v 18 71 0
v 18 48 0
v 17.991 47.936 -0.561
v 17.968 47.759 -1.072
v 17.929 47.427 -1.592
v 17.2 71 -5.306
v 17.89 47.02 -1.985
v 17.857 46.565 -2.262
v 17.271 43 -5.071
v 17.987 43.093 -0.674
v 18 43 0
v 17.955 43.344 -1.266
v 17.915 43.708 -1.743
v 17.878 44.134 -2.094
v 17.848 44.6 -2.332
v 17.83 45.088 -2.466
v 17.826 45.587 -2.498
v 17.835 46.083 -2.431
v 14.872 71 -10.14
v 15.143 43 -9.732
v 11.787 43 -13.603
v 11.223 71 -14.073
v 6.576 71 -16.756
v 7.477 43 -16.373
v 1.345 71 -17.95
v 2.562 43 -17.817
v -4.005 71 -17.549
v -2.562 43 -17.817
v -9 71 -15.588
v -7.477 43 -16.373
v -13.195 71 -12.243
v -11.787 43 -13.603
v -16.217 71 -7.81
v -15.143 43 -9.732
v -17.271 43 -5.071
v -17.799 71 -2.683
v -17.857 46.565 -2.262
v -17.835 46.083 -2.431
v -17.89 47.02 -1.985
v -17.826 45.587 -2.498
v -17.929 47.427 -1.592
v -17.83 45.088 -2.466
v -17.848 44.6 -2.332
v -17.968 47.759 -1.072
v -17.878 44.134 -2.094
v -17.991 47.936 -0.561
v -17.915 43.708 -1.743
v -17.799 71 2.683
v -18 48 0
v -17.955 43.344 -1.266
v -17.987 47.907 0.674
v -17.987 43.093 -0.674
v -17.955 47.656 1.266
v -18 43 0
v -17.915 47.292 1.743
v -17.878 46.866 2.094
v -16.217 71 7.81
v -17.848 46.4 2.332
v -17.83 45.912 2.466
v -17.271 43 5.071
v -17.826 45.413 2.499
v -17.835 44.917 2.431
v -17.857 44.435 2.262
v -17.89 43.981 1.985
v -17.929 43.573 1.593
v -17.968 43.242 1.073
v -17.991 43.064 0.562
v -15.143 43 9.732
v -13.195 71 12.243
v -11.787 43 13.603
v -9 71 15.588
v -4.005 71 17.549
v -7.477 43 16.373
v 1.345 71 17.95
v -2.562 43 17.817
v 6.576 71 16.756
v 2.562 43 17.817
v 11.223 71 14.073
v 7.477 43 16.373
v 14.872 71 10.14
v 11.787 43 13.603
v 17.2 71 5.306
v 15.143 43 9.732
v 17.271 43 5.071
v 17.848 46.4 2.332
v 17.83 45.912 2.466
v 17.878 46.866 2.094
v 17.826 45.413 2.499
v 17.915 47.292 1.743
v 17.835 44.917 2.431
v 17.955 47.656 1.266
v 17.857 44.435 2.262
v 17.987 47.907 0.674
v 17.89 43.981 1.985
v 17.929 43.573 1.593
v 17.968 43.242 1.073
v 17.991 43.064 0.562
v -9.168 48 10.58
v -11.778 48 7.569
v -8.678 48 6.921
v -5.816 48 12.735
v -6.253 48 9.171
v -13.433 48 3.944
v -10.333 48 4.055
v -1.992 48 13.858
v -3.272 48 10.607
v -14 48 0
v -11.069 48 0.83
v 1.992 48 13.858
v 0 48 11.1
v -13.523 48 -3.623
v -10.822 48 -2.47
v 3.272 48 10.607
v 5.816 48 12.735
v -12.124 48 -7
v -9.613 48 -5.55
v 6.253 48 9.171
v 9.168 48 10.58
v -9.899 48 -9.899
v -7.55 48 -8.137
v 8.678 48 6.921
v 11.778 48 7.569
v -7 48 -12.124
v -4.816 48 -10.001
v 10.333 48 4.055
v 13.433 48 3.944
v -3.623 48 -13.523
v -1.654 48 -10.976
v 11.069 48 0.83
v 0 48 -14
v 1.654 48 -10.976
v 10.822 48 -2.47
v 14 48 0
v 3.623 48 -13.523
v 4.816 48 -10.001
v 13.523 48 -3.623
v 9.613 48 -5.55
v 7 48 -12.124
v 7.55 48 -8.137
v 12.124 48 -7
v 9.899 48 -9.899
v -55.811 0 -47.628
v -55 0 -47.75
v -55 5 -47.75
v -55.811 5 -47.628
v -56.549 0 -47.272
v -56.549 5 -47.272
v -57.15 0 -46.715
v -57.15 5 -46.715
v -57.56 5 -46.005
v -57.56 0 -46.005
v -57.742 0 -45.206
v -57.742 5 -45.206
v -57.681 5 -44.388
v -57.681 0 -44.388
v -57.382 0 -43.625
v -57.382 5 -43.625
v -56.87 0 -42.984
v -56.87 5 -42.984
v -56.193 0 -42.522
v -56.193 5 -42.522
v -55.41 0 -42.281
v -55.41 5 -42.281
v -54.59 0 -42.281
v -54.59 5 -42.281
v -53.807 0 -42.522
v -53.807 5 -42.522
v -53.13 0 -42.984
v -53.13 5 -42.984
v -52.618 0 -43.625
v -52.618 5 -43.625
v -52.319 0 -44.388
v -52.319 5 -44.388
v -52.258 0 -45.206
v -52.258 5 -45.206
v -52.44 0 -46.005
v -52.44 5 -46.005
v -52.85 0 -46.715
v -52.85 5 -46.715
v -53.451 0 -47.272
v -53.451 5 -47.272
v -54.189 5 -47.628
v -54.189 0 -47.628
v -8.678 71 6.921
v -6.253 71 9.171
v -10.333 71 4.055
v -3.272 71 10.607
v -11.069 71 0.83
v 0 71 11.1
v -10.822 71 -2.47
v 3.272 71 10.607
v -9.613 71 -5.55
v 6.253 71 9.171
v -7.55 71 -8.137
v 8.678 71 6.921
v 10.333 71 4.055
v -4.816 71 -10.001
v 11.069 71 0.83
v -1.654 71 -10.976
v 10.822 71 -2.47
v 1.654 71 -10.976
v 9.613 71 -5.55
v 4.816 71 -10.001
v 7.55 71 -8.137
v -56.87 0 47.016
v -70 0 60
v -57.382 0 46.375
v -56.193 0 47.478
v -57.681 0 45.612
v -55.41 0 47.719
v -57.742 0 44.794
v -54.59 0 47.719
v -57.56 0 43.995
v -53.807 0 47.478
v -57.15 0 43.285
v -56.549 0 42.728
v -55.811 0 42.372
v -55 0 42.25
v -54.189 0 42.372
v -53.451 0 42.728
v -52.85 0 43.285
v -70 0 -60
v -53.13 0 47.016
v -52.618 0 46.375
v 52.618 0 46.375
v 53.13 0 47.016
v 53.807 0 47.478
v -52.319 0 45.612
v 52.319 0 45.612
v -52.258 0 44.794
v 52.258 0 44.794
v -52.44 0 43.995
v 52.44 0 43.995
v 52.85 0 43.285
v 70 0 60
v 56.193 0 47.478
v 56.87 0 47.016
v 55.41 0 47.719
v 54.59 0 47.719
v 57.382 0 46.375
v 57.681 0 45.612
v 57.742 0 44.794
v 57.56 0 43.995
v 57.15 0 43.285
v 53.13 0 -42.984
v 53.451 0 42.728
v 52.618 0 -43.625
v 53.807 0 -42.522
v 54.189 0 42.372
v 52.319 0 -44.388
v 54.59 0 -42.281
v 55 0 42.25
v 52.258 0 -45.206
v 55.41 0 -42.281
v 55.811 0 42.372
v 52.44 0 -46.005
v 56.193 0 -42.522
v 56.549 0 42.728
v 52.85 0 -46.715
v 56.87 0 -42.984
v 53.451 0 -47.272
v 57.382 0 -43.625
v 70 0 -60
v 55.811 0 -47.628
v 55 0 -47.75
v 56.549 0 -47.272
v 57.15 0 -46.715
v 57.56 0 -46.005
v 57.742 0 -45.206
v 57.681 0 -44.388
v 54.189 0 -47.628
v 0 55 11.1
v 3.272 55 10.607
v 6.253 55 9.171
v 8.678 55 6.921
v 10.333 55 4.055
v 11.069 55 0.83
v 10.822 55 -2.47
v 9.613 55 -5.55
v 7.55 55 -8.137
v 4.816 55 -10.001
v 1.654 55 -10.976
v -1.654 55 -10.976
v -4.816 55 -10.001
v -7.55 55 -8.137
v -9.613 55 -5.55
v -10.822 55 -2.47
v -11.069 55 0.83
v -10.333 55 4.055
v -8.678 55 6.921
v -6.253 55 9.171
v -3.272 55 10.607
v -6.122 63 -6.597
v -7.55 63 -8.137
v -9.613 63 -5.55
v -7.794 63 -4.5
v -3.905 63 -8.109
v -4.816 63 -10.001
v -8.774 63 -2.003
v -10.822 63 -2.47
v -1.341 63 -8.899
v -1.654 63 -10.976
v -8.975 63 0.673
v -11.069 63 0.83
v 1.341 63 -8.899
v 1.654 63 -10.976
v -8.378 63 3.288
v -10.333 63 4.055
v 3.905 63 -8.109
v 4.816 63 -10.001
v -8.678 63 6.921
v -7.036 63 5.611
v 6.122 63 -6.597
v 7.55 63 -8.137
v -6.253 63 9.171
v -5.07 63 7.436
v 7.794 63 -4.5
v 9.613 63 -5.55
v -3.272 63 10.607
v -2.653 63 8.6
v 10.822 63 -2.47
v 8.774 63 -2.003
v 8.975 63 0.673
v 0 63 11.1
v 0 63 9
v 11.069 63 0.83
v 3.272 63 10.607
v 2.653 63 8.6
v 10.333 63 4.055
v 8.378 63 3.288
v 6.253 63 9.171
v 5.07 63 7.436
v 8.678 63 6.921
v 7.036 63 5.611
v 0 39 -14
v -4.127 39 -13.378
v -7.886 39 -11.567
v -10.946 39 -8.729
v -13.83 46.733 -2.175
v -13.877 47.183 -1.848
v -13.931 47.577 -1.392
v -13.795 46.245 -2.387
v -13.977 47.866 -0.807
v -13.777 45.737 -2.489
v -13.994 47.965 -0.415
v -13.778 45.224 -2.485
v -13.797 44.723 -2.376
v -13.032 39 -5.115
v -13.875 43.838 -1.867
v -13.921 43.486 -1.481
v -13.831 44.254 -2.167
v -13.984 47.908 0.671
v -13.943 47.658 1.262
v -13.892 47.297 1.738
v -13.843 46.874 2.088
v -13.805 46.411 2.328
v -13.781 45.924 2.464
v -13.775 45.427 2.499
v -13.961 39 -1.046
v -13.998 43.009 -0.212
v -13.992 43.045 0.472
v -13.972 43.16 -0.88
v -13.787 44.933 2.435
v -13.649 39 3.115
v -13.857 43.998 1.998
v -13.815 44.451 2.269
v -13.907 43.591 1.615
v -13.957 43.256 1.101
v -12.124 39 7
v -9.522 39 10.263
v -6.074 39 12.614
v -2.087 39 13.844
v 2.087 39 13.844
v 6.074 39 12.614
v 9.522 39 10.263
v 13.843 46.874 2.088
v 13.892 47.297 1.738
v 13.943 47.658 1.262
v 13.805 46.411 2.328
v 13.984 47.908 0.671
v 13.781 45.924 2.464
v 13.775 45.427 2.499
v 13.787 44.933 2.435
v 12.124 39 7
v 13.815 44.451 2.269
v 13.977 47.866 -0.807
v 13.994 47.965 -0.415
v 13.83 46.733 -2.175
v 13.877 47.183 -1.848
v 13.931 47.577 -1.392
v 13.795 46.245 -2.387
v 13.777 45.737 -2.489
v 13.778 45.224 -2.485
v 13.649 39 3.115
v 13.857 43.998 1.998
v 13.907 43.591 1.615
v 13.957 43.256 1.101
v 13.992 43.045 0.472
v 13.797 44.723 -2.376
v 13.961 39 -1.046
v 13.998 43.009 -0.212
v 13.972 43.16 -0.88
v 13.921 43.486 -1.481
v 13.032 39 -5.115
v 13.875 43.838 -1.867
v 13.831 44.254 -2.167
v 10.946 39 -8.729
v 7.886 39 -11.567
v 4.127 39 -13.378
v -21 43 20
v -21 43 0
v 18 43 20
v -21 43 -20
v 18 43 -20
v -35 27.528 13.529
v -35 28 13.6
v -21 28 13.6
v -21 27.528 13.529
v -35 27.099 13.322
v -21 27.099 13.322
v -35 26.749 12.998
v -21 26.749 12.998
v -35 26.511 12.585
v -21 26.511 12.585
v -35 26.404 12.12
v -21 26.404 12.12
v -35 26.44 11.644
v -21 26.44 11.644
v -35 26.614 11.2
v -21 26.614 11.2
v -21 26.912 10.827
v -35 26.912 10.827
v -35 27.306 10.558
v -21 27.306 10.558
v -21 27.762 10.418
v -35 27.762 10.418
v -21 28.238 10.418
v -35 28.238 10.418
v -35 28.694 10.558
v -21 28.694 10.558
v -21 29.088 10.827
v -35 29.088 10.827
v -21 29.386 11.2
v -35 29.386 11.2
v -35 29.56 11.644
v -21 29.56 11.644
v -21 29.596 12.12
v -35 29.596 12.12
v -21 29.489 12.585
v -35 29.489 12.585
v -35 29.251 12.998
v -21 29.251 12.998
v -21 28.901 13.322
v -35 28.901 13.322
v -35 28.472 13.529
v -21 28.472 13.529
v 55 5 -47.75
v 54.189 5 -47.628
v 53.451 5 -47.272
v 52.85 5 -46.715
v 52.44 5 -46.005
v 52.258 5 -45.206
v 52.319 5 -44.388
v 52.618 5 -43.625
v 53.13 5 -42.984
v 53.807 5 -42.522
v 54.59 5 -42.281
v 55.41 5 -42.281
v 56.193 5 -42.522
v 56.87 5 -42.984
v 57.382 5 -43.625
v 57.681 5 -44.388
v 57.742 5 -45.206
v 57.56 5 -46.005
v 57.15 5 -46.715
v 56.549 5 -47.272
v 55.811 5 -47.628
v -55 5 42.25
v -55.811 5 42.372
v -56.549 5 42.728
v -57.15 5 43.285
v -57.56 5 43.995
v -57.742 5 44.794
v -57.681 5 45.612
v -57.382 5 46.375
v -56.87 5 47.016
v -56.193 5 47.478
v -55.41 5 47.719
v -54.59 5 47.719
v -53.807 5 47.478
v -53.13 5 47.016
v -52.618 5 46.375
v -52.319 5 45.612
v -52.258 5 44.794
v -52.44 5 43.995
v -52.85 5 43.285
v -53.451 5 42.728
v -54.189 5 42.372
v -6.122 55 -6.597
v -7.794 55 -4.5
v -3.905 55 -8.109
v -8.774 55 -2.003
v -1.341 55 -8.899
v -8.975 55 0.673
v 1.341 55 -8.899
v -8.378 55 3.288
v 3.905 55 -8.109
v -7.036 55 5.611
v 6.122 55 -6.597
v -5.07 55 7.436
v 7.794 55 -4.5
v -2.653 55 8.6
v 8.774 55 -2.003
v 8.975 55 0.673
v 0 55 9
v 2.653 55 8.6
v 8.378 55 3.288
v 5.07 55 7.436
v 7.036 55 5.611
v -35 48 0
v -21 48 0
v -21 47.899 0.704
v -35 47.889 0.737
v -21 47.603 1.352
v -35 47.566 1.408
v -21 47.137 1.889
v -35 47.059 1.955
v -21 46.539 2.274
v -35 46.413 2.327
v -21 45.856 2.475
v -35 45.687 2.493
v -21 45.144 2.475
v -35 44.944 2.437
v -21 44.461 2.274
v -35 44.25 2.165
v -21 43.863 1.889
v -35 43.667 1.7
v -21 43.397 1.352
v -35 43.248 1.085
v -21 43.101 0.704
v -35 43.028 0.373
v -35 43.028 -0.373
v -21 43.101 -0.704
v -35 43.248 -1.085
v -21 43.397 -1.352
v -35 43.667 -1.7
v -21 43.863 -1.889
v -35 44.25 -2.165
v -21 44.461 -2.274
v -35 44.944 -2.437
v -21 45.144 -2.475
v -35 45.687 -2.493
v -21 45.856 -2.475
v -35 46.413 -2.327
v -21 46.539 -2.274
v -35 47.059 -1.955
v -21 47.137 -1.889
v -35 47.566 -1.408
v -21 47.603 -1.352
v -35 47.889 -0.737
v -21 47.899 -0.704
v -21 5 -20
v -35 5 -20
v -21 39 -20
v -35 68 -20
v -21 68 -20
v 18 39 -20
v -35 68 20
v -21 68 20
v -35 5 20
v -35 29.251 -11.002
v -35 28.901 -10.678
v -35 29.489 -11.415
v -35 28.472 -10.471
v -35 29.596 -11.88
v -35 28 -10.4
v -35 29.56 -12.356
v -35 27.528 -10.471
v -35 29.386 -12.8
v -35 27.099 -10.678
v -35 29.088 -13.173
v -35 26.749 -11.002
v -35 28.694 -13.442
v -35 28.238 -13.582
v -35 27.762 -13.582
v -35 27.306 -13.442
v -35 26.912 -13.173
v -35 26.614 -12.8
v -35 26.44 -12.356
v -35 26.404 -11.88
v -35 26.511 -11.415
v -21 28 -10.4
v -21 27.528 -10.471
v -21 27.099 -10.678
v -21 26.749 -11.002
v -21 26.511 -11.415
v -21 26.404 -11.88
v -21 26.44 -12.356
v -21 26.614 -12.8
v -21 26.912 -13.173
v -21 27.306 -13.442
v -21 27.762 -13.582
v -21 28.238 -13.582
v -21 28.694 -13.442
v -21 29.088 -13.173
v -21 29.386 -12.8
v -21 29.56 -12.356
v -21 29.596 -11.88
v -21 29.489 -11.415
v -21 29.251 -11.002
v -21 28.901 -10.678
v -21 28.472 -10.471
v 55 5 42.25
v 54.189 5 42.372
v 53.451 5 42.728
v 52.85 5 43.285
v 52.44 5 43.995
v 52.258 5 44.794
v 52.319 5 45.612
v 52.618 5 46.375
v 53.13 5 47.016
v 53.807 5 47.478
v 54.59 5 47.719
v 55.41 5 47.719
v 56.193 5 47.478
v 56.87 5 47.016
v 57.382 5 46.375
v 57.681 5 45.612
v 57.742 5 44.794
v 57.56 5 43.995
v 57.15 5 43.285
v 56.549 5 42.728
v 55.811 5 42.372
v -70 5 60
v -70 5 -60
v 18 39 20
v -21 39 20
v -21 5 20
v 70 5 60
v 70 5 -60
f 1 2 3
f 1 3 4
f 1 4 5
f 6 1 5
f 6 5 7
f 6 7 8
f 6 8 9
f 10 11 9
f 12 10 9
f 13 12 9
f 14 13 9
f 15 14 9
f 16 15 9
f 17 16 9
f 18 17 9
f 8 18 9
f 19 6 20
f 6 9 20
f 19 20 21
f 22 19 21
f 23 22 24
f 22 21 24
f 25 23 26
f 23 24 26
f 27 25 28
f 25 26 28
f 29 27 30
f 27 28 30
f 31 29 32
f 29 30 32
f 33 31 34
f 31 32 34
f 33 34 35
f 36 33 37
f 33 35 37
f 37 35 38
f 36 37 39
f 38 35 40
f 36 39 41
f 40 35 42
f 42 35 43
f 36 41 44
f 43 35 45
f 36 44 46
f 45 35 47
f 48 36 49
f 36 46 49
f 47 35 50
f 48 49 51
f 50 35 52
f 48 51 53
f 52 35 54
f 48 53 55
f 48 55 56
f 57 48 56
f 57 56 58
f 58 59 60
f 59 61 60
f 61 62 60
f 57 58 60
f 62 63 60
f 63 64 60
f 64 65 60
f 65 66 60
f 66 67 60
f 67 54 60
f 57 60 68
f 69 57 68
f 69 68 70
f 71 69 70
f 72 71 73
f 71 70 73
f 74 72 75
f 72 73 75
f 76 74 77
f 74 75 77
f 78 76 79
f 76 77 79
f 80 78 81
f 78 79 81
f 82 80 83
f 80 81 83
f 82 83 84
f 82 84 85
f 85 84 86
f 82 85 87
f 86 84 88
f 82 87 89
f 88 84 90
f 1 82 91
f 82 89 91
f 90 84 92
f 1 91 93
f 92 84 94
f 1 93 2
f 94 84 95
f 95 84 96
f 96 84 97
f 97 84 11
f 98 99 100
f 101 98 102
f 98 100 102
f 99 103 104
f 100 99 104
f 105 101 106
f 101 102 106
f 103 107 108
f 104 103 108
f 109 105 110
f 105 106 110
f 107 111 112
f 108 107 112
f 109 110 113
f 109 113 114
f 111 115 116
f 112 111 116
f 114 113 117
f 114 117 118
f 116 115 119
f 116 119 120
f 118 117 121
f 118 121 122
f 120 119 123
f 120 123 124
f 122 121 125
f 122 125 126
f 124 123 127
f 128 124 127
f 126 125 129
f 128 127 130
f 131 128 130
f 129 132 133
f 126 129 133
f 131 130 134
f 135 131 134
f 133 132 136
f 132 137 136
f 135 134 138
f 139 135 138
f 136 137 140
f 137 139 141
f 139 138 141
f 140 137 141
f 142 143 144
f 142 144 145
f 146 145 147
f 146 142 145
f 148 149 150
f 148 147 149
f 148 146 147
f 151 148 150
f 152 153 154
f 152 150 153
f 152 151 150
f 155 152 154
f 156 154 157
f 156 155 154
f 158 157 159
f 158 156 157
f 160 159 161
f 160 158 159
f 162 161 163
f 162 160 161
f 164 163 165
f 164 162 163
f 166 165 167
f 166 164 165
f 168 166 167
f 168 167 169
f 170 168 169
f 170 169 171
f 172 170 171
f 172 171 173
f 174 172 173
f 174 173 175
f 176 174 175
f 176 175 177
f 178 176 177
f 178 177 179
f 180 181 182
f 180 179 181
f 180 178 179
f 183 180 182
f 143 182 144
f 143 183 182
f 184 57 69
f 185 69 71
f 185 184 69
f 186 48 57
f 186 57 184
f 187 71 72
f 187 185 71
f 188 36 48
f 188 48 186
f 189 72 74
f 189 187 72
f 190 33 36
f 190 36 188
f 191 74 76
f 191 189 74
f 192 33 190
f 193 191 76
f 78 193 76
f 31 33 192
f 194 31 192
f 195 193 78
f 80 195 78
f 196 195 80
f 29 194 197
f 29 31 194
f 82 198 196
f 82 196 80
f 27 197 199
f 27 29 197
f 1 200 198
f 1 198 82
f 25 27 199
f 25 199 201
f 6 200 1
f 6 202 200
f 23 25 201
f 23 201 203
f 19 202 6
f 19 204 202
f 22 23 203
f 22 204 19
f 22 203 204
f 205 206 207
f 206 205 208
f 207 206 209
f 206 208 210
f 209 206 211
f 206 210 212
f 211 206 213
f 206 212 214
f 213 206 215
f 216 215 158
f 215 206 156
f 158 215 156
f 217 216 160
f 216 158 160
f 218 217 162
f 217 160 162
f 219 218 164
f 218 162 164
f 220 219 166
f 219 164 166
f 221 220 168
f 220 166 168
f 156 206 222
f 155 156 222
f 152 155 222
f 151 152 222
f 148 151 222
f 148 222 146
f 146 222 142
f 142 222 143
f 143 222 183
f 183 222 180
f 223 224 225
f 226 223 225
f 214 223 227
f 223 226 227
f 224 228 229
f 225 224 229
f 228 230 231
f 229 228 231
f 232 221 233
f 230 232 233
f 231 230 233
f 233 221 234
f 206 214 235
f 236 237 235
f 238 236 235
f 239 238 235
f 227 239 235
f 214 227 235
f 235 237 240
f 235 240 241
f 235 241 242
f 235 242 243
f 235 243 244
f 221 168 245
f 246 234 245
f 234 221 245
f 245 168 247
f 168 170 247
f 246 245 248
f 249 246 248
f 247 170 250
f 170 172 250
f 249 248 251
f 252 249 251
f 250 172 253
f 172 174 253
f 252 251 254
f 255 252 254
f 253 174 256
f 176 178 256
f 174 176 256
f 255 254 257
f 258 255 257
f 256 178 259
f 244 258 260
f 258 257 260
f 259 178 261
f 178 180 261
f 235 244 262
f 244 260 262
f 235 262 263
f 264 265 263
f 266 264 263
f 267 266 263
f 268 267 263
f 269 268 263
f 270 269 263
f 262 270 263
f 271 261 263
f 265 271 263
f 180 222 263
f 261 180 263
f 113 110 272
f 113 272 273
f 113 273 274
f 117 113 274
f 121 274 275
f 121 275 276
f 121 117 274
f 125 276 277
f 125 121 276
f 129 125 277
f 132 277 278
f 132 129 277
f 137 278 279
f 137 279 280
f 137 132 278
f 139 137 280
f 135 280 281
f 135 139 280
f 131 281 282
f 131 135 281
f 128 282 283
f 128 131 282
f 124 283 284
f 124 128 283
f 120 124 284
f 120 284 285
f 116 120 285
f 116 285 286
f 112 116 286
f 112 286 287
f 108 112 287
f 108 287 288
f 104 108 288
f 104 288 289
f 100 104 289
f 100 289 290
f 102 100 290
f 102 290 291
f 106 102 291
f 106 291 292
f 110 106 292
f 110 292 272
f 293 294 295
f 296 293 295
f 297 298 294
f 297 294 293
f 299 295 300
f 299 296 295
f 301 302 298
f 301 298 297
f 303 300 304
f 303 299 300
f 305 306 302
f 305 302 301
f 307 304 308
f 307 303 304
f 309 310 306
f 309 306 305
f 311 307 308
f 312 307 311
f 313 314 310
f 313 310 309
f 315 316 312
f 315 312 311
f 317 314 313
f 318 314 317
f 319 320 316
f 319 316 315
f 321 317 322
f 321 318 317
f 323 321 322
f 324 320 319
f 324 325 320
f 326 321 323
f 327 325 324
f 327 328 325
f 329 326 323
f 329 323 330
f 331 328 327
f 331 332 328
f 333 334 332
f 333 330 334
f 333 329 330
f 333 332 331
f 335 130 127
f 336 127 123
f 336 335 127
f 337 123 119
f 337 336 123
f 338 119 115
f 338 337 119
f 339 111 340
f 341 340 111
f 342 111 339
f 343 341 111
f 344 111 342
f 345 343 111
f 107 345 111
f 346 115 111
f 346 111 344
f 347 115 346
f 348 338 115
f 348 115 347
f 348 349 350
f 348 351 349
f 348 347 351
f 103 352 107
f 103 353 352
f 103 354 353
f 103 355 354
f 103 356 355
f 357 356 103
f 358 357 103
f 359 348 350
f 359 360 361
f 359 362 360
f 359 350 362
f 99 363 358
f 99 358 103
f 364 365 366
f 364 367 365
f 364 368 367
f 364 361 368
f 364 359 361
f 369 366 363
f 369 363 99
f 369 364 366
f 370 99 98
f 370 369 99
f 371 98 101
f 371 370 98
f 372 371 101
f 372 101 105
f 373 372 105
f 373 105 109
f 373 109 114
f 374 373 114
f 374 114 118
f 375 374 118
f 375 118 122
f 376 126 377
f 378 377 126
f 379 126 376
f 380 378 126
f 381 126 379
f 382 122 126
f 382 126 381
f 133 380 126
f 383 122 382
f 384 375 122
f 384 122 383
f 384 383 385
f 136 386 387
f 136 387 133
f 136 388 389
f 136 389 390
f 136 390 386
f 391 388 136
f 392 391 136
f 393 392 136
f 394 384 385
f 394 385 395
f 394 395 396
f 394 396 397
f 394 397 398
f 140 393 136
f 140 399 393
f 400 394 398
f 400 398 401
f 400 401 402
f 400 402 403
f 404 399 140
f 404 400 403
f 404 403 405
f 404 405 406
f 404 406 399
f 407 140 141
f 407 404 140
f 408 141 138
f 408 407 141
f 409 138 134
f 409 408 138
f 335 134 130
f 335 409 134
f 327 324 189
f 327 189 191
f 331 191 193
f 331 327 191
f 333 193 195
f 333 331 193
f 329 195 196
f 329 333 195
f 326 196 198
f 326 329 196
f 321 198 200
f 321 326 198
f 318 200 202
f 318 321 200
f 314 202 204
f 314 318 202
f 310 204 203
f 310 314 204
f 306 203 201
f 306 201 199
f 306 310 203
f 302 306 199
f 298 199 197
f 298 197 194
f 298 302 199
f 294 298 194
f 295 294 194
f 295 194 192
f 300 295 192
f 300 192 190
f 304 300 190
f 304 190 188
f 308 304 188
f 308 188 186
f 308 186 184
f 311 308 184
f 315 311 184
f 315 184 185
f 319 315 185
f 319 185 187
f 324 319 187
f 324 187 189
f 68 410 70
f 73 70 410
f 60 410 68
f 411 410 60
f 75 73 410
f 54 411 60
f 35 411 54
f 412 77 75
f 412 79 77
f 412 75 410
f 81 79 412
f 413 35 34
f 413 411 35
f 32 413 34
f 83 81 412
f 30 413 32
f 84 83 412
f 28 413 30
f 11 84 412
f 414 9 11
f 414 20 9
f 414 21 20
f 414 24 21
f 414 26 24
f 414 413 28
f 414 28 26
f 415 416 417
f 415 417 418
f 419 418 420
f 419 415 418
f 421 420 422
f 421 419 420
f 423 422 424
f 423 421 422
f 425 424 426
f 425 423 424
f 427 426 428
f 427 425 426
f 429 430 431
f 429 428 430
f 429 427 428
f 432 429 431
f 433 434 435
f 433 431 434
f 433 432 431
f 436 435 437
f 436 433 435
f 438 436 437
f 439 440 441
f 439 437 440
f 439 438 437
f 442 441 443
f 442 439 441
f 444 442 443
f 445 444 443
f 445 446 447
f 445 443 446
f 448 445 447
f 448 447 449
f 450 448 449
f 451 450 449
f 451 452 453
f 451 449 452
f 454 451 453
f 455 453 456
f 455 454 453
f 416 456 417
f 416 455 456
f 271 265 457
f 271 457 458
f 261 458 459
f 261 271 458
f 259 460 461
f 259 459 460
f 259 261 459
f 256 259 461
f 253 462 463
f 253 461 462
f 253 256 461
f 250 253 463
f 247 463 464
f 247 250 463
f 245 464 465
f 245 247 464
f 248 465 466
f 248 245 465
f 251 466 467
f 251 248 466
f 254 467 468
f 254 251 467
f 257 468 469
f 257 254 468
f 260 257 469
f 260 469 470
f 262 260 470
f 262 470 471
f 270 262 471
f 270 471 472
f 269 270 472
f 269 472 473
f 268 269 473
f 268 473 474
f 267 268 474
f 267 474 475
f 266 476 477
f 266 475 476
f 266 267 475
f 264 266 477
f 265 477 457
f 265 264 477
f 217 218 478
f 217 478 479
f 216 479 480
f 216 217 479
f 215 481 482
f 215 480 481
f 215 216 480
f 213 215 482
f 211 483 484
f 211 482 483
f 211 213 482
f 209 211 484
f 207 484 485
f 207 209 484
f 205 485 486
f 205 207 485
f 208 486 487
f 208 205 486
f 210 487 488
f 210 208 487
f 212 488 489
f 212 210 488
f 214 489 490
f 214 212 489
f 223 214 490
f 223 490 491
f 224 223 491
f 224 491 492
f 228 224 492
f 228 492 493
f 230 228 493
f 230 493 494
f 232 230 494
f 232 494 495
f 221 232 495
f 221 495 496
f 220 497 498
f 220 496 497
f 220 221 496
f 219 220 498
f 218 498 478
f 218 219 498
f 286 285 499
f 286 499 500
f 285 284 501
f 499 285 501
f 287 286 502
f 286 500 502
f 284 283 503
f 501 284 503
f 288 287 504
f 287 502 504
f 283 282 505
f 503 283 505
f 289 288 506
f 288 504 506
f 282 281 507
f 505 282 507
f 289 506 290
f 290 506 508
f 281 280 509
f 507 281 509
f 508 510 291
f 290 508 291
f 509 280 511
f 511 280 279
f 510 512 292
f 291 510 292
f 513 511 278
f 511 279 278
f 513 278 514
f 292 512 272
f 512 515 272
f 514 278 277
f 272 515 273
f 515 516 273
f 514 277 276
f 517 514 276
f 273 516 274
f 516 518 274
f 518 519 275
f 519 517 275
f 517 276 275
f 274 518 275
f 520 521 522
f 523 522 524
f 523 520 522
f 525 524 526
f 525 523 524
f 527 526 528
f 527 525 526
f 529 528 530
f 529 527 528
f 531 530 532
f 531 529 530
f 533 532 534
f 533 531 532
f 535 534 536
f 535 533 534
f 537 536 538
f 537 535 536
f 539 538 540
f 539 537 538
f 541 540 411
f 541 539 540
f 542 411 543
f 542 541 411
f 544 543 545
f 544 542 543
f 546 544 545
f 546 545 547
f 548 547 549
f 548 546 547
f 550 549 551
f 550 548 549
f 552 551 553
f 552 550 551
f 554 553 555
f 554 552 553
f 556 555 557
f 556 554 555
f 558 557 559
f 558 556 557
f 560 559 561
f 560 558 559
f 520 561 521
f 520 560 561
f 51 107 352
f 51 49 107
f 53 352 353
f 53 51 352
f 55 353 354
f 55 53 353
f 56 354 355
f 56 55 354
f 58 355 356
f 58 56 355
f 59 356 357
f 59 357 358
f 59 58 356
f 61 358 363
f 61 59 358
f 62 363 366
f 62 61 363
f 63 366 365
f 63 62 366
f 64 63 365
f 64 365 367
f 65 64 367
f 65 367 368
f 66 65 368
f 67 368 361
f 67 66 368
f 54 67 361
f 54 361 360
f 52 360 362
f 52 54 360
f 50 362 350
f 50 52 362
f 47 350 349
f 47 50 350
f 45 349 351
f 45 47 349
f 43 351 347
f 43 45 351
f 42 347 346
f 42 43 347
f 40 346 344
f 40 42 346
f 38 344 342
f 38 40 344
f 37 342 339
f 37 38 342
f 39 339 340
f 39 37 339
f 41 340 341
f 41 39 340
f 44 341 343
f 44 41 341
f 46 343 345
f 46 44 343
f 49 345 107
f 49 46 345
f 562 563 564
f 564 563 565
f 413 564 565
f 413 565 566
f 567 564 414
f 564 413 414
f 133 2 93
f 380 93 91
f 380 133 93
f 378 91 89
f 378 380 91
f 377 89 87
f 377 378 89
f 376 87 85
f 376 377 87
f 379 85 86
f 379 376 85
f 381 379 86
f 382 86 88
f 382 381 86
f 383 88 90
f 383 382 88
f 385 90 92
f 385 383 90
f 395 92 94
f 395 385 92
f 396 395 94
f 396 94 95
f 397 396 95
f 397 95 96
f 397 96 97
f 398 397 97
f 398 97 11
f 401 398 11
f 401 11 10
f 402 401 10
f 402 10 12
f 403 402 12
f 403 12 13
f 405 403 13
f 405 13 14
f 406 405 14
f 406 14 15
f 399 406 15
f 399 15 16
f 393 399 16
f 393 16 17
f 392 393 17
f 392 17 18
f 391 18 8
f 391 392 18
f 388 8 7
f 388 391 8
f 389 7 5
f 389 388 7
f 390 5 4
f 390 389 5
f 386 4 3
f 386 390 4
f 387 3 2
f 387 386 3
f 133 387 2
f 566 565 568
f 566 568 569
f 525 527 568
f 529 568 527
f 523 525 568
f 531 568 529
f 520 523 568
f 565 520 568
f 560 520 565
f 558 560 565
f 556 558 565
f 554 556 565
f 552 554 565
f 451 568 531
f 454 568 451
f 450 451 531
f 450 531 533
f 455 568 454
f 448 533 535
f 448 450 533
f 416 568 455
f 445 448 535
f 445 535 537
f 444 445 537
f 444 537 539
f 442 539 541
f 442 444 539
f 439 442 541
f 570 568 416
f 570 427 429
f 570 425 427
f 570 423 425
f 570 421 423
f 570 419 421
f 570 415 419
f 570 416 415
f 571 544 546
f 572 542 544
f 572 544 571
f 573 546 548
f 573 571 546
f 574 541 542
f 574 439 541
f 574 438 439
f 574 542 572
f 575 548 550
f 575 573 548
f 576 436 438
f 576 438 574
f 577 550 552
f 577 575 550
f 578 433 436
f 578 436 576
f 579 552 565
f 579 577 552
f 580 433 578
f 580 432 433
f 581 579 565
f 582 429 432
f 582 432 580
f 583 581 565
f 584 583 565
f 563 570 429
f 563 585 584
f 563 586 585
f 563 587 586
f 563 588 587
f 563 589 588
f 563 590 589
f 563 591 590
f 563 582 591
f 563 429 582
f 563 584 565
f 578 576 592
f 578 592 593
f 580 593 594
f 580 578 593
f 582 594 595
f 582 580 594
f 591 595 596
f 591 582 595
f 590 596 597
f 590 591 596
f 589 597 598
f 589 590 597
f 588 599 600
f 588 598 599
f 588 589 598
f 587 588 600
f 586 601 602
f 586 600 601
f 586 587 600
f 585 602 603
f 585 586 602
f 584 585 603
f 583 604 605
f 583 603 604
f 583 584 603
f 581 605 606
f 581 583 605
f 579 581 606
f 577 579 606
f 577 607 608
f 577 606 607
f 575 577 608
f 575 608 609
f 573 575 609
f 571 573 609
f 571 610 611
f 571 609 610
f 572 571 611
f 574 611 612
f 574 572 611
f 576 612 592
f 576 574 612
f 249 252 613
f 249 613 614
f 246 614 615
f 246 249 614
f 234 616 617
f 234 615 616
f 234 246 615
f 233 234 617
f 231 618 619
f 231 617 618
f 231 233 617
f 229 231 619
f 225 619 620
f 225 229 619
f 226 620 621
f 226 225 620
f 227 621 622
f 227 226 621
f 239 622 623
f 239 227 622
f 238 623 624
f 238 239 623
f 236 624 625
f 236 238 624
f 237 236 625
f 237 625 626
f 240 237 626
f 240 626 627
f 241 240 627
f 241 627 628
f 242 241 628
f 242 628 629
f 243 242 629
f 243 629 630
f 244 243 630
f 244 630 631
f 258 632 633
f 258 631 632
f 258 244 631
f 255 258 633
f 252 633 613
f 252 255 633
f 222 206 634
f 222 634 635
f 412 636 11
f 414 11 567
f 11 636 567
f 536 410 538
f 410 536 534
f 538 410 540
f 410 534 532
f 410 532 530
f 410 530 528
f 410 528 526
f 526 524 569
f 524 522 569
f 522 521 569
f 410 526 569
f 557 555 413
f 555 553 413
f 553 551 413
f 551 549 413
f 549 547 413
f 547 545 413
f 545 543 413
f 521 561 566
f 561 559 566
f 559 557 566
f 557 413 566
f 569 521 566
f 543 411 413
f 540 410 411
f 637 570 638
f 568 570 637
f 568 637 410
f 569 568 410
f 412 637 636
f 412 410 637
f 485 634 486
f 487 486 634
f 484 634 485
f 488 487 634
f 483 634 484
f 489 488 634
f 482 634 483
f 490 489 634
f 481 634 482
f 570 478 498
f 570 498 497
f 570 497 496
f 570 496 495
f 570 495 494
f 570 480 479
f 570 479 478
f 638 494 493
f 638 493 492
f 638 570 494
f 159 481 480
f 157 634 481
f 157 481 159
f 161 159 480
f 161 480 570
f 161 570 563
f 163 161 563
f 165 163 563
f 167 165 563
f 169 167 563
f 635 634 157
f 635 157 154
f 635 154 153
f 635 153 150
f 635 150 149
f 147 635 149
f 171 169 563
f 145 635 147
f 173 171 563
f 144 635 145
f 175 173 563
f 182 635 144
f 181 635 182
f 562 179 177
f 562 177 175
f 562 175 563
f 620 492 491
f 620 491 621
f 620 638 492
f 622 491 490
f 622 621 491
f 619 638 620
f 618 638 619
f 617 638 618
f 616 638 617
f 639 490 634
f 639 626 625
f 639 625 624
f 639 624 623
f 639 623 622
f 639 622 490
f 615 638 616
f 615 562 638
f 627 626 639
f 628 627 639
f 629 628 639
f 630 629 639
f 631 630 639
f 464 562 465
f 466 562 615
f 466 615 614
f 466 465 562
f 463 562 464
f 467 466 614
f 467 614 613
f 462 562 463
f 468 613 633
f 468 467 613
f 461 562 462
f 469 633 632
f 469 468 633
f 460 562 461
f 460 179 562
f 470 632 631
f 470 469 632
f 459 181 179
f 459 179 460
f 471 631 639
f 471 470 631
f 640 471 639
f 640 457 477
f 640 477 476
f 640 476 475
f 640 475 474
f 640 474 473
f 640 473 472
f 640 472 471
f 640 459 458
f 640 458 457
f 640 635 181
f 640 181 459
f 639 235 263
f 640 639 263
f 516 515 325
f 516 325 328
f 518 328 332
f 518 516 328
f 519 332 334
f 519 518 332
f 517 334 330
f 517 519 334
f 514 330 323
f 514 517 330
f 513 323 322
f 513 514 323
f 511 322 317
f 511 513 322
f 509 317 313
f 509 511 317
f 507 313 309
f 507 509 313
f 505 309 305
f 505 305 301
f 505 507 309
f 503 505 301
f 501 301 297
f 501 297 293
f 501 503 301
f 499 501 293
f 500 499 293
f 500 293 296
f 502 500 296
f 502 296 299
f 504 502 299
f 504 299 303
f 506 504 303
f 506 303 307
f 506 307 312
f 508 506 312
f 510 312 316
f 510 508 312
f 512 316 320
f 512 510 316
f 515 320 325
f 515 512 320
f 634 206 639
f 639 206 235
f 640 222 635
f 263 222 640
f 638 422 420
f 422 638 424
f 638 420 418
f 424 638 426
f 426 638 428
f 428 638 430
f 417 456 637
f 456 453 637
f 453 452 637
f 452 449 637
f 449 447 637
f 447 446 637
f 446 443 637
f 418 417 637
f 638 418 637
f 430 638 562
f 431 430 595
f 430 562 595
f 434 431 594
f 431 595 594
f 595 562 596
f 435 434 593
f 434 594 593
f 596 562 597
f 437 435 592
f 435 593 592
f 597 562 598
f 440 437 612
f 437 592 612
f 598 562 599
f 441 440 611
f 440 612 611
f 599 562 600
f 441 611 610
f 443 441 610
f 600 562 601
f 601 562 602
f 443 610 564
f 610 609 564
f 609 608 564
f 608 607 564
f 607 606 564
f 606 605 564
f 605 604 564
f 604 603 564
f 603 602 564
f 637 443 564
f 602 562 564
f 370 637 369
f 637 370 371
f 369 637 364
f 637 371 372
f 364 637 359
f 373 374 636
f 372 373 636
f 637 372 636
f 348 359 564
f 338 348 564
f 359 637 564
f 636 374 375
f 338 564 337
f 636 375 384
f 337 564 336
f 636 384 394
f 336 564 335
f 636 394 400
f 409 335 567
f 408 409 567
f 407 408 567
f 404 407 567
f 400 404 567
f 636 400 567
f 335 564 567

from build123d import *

# Parameters (mm, degrees)
BENCH_FOOTPRINT_140X120_PROFILE_W       = 140
BENCH_FOOTPRINT_140X120_PROFILE_H       = 120
BENCH_FOOTPRINT_140X120_DEPTH           = 5
BACKBONE_START                          = -20
BACKBONE_PROFILE_W                      = 14
BACKBONE_PROFILE_H                      = 63
BACKBONE_DEPTH                          = 40
REMOVABLE_SERVO_MOUNT_M3_START          = -40
REMOVABLE_SERVO_MOUNT_M3_PROFILE_R      = 1.6
REMOVABLE_SERVO_MOUNT_M3_DEPTH          = 155.560027933
BEARING_BRIDGE_START                    = 39
BEARING_BRIDGE_PROFILE_W                = 53
BEARING_BRIDGE_PROFILE_H                = 40
BEARING_BRIDGE_DEPTH                    = 4
BRIDGE_HORN_CLEARANCE_START             = 38
BRIDGE_HORN_CLEARANCE_PROFILE_R         = 14
BRIDGE_HORN_CLEARANCE_DEPTH             = 77.560027933
DRIVE_COLLAR_CHAMBER_START              = 43
DRIVE_COLLAR_CHAMBER_PROFILE_R          = 18
DRIVE_COLLAR_CHAMBER_PROFILE_R_2        = 14
DRIVE_COLLAR_CHAMBER_DEPTH              = 5
BEARING_TOWER_START                     = 48
BEARING_TOWER_PROFILE_R                 = 18
BEARING_TOWER_PROFILE_R_2               = 11.1
BEARING_TOWER_DEPTH                     = 23
BEARING_SEPARATION_SHOULDER_START       = 55
BEARING_SEPARATION_SHOULDER_PROFILE_R   = 11.1
BEARING_SEPARATION_SHOULDER_PROFILE_R_2 = 9
BEARING_SEPARATION_SHOULDER_DEPTH       = 8
BENCH_CLAMP_HOLES_START                 = -1
BENCH_CLAMP_HOLES_PROFILE_R             = 2.75
BENCH_CLAMP_HOLES_DEPTH                 = 118.365802537
YAW_CROSSBOLT_ACCESS_START              = -40
YAW_CROSSBOLT_ACCESS_PROFILE_R          = 2.5
YAW_CROSSBOLT_ACCESS_DEPTH              = 157.365802537


with BuildPart() as part:
    # Bench_footprint_140x120_profile → Bench_footprint_140x120 (new body)
    with BuildSketch(Plane(origin=(0, 0, 0), x_dir=(1, 0, 0), z_dir=(0, 1, 0))):
        Rectangle(BENCH_FOOTPRINT_140X120_PROFILE_W, BENCH_FOOTPRINT_140X120_PROFILE_H)
    extrude(amount=BENCH_FOOTPRINT_140X120_DEPTH)

    # Backbone_profile → Backbone (add)
    with BuildSketch(Plane.XY.offset(BACKBONE_START)):
        with Locations((-28, 36.5)):
            Rectangle(BACKBONE_PROFILE_W, BACKBONE_PROFILE_H)
    extrude(amount=BACKBONE_DEPTH)

    # Removable_servo_mount_M3_profile → Removable_servo_mount_M3 (cut, through all)
    with BuildSketch(Plane(origin=(0, 0, 0), x_dir=(0, 0, -1), z_dir=(1, 0, 0)).offset(REMOVABLE_SERVO_MOUNT_M3_START)):
        with Locations(Location((12, 28, 0), (0, 0, 180))):
            Circle(REMOVABLE_SERVO_MOUNT_M3_PROFILE_R)
        with Locations(Location((-12, 28, 0), (0, 0, 180))):
            Circle(REMOVABLE_SERVO_MOUNT_M3_PROFILE_R)
    extrude(amount=REMOVABLE_SERVO_MOUNT_M3_DEPTH, mode=Mode.SUBTRACT)

    # Bearing_bridge_profile → Bearing_bridge (add)
    with BuildSketch(Plane(origin=(0, 0, 0), x_dir=(1, 0, 0), z_dir=(0, 1, 0)).offset(BEARING_BRIDGE_START)):
        with Locations((-8.5, 0)):
            Rectangle(BEARING_BRIDGE_PROFILE_W, BEARING_BRIDGE_PROFILE_H)
    extrude(amount=BEARING_BRIDGE_DEPTH)

    # Bridge_horn_clearance_profile → Bridge_horn_clearance (cut, through all)
    with BuildSketch(Plane(origin=(0, 0, 0), x_dir=(1, 0, 0), z_dir=(0, 1, 0)).offset(BRIDGE_HORN_CLEARANCE_START)):
        with Locations(Location((0, 0, 0), (0, 0, 90))):
            Circle(BRIDGE_HORN_CLEARANCE_PROFILE_R)
    extrude(amount=BRIDGE_HORN_CLEARANCE_DEPTH, mode=Mode.SUBTRACT)

    # Drive_collar_chamber_profile → Drive_collar_chamber (add)
    with BuildSketch(Plane(origin=(0, 0, 0), x_dir=(1, 0, 0), z_dir=(0, 1, 0)).offset(DRIVE_COLLAR_CHAMBER_START)):
        Circle(DRIVE_COLLAR_CHAMBER_PROFILE_R)
        with Locations(Location((0, 0, 0), (0, 0, 90))):
            Circle(DRIVE_COLLAR_CHAMBER_PROFILE_R_2, mode=Mode.SUBTRACT)
    extrude(amount=DRIVE_COLLAR_CHAMBER_DEPTH)

    # Bearing_tower_profile → Bearing_tower (add)
    with BuildSketch(Plane(origin=(0, 0, 0), x_dir=(1, 0, 0), z_dir=(0, 1, 0)).offset(BEARING_TOWER_START)):
        Circle(BEARING_TOWER_PROFILE_R)
        with Locations(Location((0, 0, 0), (0, 0, 270))):
            Circle(BEARING_TOWER_PROFILE_R_2, mode=Mode.SUBTRACT)
    extrude(amount=BEARING_TOWER_DEPTH)

    # Bearing_separation_shoulder_profile → Bearing_separation_shoulder (add)
    with BuildSketch(Plane(origin=(0, 0, 0), x_dir=(1, 0, 0), z_dir=(0, 1, 0)).offset(BEARING_SEPARATION_SHOULDER_START)):
        with Locations(Location((0, 0, 0), (0, 0, 270))):
            Circle(BEARING_SEPARATION_SHOULDER_PROFILE_R)
        with Locations(Location((0, 0, 0), (0, 0, 270))):
            Circle(BEARING_SEPARATION_SHOULDER_PROFILE_R_2, mode=Mode.SUBTRACT)
    extrude(amount=BEARING_SEPARATION_SHOULDER_DEPTH)

    # Bench_clamp_holes_profile → Bench_clamp_holes (cut, through all)
    with BuildSketch(Plane(origin=(0, 0, 0), x_dir=(1, 0, 0), z_dir=(0, 1, 0)).offset(BENCH_CLAMP_HOLES_START)):
        with Locations(Location((-55, -45, 0), (0, 0, 90))):
            Circle(BENCH_CLAMP_HOLES_PROFILE_R)
        with Locations(Location((55, -45, 0), (0, 0, 90))):
            Circle(BENCH_CLAMP_HOLES_PROFILE_R)
        with Locations(Location((-55, 45, 0), (0, 0, 90))):
            Circle(BENCH_CLAMP_HOLES_PROFILE_R)
        with Locations(Location((55, 45, 0), (0, 0, 90))):
            Circle(BENCH_CLAMP_HOLES_PROFILE_R)
    extrude(amount=BENCH_CLAMP_HOLES_DEPTH, mode=Mode.SUBTRACT)

    # Yaw_crossbolt_access_profile → Yaw_crossbolt_access (cut, through all)
    with BuildSketch(Plane(origin=(0, 0, 0), x_dir=(0, 0, -1), z_dir=(1, 0, 0)).offset(YAW_CROSSBOLT_ACCESS_START)):
        with Locations(Location((0, 45.5, 0), (0, 0, 90))):
            Circle(YAW_CROSSBOLT_ACCESS_PROFILE_R)
    extrude(amount=YAW_CROSSBOLT_ACCESS_DEPTH, mode=Mode.SUBTRACT)


solid = part.part
